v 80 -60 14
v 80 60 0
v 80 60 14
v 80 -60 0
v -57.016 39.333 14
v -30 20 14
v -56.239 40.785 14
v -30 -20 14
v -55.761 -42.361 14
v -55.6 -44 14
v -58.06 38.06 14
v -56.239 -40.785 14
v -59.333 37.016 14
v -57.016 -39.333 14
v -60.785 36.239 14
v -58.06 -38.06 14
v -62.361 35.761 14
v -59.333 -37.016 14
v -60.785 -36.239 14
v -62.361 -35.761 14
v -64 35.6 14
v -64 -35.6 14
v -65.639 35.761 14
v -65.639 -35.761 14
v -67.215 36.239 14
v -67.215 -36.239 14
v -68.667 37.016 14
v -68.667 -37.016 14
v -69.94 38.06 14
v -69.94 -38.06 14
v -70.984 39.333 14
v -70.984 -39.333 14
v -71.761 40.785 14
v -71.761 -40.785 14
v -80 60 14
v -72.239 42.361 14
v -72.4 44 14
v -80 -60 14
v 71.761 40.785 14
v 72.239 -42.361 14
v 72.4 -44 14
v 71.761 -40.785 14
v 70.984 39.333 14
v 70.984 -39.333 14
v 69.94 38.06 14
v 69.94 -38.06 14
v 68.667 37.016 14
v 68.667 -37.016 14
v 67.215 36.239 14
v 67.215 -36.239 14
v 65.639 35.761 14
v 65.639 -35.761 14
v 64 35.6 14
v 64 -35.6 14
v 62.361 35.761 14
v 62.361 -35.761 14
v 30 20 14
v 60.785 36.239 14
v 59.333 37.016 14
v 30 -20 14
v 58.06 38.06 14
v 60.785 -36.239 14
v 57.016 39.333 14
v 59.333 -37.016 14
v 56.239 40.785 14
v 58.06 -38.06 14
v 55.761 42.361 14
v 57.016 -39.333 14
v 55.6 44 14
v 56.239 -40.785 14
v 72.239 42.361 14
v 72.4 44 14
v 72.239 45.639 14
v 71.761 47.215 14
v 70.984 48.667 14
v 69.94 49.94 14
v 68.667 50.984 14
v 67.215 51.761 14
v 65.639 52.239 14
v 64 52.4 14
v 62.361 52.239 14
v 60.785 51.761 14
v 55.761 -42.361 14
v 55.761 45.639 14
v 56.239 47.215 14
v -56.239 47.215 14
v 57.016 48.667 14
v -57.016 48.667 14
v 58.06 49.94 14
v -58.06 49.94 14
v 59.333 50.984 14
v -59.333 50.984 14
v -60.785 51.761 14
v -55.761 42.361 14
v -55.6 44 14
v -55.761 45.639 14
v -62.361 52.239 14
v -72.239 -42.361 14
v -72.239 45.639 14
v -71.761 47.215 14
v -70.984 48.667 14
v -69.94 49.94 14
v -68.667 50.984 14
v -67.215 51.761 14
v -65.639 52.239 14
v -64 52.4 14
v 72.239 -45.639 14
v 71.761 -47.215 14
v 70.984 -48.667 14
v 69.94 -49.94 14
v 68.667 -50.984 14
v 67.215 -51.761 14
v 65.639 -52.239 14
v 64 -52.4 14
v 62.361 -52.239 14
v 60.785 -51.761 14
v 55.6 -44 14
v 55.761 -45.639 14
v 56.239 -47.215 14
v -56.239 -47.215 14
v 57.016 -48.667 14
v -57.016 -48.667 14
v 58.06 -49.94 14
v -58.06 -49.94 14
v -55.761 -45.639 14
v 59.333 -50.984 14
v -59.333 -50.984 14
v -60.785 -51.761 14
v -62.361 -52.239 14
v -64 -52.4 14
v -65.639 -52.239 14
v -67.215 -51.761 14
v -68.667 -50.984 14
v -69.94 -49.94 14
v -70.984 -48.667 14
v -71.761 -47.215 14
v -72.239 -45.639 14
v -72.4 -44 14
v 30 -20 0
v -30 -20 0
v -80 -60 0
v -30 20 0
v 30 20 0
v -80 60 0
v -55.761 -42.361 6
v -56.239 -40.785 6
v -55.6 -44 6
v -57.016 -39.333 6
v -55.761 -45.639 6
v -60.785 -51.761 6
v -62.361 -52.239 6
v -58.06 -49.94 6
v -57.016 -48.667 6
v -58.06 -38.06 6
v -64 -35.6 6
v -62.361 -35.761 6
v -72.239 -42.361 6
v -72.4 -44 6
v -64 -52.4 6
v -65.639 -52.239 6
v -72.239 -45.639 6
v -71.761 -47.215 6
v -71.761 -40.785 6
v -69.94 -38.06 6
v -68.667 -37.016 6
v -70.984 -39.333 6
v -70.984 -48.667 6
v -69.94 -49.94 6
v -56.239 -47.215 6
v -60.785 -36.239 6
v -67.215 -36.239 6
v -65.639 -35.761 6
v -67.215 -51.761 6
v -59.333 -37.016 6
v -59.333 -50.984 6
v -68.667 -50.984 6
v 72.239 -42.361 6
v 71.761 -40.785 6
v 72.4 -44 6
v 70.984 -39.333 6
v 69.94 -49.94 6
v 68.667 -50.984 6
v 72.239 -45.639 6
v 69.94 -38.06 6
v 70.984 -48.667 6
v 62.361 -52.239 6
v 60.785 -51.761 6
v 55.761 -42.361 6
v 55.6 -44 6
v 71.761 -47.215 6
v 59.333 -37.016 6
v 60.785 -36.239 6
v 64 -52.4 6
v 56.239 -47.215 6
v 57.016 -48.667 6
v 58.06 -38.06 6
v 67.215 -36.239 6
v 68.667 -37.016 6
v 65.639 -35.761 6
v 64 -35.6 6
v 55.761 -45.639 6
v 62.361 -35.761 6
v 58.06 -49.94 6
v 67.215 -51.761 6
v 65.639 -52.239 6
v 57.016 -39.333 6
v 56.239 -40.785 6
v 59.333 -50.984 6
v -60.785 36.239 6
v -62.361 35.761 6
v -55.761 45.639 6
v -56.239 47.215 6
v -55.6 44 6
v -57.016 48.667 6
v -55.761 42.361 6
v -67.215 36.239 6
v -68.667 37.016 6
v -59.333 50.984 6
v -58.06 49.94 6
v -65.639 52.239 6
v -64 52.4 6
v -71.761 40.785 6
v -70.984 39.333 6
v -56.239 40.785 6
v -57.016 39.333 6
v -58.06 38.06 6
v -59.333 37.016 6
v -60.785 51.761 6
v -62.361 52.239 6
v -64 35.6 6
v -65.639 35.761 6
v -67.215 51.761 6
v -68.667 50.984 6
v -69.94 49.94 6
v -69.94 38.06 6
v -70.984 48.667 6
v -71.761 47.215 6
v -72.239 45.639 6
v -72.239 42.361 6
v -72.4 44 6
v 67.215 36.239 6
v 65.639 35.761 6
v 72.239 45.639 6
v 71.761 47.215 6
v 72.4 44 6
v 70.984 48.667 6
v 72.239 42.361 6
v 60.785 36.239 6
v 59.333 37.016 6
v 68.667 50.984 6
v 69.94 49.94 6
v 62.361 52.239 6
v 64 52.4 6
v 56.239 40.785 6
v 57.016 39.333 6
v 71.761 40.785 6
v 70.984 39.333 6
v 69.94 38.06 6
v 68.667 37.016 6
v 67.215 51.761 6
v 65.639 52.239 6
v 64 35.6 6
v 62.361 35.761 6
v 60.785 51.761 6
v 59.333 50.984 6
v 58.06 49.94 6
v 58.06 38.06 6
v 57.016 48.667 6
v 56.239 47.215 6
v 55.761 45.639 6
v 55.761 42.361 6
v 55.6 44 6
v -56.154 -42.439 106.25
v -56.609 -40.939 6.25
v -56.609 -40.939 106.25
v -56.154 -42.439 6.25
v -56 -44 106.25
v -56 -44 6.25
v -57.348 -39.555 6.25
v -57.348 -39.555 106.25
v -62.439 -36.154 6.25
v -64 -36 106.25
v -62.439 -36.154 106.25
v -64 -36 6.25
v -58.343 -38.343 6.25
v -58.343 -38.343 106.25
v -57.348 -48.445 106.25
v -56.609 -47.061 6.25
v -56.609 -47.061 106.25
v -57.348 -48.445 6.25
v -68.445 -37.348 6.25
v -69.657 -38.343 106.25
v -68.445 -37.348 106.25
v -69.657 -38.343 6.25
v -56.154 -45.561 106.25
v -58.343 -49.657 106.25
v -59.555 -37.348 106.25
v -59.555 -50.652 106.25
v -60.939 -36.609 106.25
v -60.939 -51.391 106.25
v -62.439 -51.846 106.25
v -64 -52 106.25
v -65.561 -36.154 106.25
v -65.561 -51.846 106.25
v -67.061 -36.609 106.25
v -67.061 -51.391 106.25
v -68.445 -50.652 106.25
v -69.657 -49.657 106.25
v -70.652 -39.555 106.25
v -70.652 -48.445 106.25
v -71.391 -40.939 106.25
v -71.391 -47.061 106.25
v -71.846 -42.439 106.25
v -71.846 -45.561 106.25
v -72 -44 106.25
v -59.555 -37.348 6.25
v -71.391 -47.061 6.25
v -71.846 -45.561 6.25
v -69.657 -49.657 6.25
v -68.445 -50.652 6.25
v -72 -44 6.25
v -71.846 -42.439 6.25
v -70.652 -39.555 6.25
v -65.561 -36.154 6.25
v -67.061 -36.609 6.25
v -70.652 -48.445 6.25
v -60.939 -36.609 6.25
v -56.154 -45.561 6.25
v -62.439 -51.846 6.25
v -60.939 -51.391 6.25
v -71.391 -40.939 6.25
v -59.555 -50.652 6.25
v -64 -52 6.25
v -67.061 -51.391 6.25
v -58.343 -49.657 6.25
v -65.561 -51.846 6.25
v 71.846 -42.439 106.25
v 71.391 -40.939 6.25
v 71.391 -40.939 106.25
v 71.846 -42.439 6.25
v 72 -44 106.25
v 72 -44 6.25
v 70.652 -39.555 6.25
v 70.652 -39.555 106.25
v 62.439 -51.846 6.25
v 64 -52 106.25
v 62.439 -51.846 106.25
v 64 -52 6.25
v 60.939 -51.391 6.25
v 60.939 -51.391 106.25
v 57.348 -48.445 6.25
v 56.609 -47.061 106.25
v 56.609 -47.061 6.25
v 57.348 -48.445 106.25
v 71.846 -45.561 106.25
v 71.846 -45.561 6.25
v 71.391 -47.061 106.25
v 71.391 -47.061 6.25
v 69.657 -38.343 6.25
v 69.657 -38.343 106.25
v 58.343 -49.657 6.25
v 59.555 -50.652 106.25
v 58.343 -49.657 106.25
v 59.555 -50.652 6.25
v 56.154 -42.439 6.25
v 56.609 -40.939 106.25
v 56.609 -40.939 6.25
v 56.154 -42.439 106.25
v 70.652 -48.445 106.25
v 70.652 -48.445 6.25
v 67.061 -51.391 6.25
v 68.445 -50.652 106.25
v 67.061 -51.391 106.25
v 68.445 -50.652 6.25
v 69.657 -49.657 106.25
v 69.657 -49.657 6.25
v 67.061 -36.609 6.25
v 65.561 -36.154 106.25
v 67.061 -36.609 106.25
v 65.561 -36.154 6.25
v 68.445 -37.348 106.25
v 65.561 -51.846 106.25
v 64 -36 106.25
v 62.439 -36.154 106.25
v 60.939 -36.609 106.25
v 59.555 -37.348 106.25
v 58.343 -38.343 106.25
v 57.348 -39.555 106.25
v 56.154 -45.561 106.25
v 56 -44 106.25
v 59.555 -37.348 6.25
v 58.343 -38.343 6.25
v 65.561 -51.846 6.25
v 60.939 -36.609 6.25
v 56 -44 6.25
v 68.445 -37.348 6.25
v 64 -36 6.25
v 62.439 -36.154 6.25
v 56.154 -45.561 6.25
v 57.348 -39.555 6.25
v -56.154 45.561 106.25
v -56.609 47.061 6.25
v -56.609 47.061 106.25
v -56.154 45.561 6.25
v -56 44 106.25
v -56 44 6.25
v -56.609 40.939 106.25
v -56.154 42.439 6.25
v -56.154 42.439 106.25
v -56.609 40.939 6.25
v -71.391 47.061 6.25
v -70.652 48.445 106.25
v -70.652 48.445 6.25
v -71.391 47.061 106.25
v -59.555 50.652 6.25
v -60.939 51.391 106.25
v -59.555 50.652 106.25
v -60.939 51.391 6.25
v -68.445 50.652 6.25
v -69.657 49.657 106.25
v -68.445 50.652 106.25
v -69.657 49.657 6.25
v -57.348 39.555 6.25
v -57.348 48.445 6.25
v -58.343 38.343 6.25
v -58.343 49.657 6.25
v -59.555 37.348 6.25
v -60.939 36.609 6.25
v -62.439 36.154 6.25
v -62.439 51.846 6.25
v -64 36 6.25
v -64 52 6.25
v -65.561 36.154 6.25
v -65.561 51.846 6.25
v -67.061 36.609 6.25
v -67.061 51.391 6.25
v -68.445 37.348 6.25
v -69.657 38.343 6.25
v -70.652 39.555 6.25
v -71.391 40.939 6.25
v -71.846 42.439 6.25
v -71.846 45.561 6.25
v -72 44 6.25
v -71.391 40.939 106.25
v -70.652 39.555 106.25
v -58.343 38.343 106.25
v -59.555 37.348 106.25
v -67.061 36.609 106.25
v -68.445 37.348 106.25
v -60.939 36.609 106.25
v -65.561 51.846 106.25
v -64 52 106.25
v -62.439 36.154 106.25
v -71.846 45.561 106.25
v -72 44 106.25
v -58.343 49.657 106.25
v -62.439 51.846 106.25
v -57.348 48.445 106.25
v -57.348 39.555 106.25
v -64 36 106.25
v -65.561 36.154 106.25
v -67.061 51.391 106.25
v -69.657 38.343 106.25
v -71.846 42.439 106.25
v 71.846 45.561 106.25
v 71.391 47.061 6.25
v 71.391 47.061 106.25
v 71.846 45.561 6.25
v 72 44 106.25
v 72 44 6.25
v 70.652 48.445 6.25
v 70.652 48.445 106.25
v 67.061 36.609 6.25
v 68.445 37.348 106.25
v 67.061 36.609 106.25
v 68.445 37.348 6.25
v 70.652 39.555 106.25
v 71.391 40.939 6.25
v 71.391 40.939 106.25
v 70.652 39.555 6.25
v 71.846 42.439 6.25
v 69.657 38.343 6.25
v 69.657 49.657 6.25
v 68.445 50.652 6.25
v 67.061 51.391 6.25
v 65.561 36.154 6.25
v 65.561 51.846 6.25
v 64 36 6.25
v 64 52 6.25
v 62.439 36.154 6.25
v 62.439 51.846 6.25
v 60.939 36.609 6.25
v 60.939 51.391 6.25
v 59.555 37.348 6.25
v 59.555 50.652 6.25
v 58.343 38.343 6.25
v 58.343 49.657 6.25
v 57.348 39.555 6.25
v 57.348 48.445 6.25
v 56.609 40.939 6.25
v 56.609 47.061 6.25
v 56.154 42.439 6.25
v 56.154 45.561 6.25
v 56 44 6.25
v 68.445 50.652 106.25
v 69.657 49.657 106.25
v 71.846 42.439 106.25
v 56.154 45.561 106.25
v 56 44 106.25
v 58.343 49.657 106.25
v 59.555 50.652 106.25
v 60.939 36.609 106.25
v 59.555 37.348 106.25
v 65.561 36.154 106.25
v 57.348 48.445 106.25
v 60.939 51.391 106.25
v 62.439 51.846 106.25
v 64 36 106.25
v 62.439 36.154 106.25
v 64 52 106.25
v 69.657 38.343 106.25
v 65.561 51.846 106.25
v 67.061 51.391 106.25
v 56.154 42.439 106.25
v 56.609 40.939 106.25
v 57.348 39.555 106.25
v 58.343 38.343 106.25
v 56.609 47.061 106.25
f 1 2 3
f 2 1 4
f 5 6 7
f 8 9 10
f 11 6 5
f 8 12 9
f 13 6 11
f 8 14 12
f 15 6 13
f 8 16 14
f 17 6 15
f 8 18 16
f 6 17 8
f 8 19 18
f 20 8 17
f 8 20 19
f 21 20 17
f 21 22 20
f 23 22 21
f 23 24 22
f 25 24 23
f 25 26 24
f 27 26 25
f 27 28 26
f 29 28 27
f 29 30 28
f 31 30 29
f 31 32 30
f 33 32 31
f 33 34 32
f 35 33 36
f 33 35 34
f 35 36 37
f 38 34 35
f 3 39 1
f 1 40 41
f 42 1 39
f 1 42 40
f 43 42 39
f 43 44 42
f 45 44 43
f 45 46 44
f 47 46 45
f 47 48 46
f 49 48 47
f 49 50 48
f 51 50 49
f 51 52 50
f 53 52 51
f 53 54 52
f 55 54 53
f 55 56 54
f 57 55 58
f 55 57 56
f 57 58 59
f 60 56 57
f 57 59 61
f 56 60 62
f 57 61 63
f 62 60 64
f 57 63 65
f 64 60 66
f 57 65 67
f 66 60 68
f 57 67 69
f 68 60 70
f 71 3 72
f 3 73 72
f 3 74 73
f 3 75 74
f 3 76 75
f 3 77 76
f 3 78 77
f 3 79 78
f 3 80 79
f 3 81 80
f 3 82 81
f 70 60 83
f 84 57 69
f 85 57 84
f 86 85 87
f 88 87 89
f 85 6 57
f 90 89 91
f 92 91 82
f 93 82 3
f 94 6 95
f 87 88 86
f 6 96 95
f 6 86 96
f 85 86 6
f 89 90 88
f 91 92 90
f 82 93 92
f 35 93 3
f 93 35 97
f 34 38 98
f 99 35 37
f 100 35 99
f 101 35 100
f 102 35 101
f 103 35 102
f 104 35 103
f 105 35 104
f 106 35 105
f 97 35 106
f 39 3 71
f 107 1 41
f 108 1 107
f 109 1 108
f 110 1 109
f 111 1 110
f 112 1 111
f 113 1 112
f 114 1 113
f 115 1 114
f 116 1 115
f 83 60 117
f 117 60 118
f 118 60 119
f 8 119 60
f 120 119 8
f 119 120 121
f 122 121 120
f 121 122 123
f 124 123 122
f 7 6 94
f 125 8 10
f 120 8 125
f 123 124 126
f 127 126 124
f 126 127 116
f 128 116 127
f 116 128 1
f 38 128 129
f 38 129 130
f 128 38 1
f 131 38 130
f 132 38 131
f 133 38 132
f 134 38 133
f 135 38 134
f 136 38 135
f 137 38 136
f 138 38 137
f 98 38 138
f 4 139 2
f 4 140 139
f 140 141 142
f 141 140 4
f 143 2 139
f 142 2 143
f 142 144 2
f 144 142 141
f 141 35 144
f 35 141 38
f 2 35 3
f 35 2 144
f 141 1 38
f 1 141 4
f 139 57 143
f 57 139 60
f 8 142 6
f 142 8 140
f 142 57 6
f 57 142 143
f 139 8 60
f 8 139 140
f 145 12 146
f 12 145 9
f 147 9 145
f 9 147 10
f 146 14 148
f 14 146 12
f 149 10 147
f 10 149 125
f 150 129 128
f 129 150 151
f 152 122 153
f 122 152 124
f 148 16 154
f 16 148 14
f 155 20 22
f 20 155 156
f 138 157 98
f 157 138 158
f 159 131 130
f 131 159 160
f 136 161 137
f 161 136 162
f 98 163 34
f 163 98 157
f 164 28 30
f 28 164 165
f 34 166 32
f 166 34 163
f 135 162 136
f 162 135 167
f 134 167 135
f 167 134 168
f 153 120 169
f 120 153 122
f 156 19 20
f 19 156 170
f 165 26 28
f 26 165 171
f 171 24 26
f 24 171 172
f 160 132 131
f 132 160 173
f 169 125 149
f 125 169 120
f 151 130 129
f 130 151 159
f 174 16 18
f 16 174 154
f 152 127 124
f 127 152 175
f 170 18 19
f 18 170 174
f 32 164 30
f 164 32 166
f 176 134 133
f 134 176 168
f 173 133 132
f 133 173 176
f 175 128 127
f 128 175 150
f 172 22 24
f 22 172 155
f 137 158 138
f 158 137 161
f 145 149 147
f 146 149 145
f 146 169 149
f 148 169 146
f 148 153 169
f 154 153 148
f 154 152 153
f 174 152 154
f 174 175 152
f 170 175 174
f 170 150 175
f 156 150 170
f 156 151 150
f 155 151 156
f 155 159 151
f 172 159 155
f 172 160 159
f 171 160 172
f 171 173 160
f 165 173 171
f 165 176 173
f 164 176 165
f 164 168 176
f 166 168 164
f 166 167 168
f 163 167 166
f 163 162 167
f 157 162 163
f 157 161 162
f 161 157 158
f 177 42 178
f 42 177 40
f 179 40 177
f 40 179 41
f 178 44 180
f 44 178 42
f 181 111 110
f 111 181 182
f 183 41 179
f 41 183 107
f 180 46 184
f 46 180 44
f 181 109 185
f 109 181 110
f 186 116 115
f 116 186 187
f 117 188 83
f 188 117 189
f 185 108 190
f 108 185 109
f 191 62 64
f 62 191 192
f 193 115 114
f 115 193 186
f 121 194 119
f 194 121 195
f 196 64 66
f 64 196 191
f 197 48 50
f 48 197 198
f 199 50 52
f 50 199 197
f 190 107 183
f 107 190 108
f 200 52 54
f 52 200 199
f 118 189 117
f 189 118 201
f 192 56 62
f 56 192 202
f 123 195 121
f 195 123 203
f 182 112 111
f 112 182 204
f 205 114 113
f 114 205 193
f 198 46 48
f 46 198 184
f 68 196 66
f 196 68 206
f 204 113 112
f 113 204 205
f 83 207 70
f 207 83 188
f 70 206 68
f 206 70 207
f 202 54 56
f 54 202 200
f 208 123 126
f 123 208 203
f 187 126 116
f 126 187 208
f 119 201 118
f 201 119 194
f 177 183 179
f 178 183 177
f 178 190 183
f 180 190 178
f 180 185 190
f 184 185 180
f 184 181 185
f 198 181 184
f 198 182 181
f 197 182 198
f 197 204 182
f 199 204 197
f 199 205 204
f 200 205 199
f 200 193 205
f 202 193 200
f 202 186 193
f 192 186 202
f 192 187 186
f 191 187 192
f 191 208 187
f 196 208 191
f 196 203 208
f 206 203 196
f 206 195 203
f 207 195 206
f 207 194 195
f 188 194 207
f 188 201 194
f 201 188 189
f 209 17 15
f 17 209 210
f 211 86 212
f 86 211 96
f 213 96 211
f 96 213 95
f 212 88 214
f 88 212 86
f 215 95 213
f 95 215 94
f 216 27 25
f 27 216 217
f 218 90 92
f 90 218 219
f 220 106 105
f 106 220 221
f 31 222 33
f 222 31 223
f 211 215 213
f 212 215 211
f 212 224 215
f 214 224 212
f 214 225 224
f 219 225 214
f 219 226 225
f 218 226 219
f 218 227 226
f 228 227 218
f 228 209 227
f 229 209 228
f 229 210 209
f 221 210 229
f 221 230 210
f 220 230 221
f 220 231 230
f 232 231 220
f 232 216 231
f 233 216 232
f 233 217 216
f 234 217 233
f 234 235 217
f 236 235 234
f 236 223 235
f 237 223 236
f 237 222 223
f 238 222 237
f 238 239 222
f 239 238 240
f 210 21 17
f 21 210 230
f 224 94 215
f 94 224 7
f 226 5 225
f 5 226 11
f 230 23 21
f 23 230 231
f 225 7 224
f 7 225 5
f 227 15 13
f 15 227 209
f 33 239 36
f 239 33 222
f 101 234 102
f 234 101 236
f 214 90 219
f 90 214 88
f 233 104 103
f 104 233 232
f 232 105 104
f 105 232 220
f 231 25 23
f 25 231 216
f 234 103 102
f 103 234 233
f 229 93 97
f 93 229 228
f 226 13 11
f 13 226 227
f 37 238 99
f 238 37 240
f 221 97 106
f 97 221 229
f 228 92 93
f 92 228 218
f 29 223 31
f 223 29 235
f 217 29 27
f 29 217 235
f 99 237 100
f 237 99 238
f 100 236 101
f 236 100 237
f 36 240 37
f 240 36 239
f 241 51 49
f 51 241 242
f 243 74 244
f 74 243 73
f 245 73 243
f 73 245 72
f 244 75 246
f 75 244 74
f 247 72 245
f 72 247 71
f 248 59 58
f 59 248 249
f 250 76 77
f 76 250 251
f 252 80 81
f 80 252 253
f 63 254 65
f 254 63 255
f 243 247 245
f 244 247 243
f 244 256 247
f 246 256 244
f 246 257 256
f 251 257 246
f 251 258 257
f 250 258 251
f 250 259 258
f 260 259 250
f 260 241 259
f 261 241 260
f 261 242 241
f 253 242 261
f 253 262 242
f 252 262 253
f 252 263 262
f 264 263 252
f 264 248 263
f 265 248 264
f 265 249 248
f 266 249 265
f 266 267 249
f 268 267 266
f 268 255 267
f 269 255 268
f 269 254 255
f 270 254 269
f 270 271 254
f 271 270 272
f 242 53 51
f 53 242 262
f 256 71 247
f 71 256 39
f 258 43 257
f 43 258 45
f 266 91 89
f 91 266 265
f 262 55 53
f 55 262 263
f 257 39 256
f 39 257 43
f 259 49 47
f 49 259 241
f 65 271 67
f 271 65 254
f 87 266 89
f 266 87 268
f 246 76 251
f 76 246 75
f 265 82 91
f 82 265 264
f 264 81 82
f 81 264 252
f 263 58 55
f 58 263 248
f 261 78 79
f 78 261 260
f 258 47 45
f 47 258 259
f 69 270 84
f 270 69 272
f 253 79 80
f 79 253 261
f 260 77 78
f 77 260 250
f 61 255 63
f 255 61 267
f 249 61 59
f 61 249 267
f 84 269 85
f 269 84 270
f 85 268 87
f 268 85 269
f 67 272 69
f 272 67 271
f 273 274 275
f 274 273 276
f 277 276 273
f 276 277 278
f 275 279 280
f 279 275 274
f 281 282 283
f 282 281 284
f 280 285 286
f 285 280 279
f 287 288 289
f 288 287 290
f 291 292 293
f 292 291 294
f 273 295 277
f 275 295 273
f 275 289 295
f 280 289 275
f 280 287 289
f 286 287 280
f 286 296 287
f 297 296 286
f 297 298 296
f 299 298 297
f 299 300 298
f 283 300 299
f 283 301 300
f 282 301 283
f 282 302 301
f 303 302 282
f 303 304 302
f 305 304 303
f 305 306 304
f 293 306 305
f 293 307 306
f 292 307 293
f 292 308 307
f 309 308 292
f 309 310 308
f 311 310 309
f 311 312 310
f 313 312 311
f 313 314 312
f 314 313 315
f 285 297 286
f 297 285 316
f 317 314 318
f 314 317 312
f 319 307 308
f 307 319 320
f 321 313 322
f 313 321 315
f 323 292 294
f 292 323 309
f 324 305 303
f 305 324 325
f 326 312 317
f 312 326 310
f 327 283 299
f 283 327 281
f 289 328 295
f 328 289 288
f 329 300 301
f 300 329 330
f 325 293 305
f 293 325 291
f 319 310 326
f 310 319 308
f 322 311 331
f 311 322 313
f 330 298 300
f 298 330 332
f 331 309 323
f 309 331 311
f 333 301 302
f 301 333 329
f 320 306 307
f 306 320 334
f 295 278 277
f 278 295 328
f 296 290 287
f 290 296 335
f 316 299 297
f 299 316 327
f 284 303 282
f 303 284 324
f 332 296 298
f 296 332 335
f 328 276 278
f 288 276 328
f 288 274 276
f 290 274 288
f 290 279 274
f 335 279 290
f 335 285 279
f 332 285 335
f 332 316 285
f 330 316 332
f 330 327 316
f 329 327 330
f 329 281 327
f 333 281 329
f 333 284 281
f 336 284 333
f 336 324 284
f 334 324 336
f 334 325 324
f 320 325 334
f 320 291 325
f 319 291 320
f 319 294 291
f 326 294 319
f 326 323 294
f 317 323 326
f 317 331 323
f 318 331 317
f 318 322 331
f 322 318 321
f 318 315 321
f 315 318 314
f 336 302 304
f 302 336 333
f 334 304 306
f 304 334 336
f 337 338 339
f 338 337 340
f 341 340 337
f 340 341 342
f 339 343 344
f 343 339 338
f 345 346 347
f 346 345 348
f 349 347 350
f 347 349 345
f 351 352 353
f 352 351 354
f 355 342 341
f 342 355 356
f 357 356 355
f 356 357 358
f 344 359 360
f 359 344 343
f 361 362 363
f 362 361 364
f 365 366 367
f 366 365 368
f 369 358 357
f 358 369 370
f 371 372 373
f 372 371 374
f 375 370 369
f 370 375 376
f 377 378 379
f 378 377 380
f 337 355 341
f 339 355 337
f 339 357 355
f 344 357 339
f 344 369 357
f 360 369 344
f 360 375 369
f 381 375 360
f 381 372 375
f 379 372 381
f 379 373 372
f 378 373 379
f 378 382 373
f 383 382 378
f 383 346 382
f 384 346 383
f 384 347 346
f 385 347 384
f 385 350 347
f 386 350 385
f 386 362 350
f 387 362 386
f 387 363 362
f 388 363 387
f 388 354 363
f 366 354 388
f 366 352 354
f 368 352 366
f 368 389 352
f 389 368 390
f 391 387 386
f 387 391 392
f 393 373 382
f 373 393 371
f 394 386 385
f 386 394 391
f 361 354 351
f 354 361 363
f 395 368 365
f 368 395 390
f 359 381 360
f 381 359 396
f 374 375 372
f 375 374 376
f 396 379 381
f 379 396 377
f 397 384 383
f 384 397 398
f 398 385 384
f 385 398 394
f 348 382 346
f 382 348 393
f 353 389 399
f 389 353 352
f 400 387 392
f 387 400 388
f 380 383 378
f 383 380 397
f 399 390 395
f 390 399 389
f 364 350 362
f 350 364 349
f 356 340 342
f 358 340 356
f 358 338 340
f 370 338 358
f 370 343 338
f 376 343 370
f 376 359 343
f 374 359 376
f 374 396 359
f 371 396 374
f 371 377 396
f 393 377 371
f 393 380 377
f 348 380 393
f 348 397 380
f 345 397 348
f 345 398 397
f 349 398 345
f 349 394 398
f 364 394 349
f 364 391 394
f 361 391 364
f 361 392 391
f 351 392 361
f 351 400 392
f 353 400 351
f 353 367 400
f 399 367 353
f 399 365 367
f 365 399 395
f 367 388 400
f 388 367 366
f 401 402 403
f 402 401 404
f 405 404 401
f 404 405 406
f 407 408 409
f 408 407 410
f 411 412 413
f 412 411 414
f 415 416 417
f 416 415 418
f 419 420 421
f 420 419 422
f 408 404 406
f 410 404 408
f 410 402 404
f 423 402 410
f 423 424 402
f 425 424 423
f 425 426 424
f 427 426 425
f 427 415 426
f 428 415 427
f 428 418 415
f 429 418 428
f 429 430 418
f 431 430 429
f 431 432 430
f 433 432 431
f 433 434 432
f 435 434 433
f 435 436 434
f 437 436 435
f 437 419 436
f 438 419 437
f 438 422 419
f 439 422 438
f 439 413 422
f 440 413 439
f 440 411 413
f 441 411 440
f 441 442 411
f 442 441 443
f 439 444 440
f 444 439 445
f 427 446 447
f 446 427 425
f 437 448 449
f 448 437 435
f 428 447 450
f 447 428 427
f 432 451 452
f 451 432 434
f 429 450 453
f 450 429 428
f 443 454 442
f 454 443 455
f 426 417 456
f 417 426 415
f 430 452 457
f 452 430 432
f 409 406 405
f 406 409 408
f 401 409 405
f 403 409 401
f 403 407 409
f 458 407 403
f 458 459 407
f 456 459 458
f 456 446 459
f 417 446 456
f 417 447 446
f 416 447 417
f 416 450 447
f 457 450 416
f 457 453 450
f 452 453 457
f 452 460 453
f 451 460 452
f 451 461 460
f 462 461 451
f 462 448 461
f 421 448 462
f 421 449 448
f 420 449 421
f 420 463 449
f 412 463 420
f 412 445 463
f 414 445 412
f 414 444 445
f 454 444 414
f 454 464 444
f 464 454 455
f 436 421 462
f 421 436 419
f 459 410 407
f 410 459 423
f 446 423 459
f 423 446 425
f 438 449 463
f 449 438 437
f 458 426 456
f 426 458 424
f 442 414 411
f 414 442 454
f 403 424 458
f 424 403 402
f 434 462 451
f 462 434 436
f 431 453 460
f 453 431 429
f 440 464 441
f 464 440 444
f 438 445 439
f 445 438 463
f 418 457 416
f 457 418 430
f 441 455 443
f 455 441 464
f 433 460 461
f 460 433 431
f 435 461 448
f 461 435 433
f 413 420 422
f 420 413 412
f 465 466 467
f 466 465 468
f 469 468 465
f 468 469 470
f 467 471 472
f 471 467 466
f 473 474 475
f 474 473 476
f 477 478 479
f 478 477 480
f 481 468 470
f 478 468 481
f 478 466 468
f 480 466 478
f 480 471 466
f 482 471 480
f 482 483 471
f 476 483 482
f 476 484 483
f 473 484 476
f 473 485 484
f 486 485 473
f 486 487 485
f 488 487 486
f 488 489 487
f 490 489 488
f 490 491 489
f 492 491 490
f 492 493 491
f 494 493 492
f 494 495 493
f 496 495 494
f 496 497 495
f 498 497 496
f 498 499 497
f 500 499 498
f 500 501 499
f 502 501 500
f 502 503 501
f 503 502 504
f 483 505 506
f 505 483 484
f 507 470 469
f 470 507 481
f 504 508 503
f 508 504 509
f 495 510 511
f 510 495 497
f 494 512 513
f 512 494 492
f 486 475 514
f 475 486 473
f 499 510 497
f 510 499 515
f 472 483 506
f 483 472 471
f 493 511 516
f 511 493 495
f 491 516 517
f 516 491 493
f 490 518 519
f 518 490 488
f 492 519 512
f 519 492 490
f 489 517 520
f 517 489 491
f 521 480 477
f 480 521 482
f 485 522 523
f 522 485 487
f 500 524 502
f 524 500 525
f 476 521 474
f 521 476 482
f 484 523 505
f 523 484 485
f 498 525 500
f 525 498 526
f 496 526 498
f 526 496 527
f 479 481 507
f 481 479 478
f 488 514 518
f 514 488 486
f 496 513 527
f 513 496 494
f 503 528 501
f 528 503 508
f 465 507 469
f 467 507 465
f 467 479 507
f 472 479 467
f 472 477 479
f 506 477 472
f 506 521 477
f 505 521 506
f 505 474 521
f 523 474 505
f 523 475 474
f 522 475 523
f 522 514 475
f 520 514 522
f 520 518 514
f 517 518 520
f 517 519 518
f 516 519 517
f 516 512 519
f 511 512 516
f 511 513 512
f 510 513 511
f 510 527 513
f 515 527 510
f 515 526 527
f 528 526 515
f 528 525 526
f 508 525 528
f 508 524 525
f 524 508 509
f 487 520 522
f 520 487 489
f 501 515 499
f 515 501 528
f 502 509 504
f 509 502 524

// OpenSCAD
$fn = 32;

// ------------------------------------------------------------------------
// Frame with four posts: 160 x 120 mm frame, four d16 posts
// Every part is its own module, assembly() places them once.
// ------------------------------------------------------------------------

// --- part 1 ---
module base_frame() {
  difference() {
    translate([-80, -60, 0]) cube([160, 120, 14]);
    translate([-30, -20, -1]) cube([60, 40, 16]);
    translate([-64, -44, 6]) cylinder(h = 9, d = 16.8);
    translate([64, -44, 6]) cylinder(h = 9, d = 16.8);
    translate([-64, 44, 6]) cylinder(h = 9, d = 16.8);
    translate([64, 44, 6]) cylinder(h = 9, d = 16.8);
  }
}

// --- part 2 ---
module post1() {
  cylinder(h = 100, d = 16);
}

// --- part 3 ---
module post2() {
  cylinder(h = 100, d = 16);
}

// --- part 4 ---
module post3() {
  cylinder(h = 100, d = 16);
}

// --- part 5 ---
module post4() {
  cylinder(h = 100, d = 16);
}

// --- assembly ---
module assembly() {
  translate([0, 0, 0]) rotate([0, 0, 0]) base_frame();
  translate([-64, -44, 6.25]) rotate([0, 0, 0]) post1();
  translate([64, -44, 6.25]) rotate([0, 0, 0]) post2();
  translate([-64, 44, 6.25]) rotate([0, 0, 0]) post3();
  translate([64, 44, 6.25]) rotate([0, 0, 0]) post4();
}

assembly();
